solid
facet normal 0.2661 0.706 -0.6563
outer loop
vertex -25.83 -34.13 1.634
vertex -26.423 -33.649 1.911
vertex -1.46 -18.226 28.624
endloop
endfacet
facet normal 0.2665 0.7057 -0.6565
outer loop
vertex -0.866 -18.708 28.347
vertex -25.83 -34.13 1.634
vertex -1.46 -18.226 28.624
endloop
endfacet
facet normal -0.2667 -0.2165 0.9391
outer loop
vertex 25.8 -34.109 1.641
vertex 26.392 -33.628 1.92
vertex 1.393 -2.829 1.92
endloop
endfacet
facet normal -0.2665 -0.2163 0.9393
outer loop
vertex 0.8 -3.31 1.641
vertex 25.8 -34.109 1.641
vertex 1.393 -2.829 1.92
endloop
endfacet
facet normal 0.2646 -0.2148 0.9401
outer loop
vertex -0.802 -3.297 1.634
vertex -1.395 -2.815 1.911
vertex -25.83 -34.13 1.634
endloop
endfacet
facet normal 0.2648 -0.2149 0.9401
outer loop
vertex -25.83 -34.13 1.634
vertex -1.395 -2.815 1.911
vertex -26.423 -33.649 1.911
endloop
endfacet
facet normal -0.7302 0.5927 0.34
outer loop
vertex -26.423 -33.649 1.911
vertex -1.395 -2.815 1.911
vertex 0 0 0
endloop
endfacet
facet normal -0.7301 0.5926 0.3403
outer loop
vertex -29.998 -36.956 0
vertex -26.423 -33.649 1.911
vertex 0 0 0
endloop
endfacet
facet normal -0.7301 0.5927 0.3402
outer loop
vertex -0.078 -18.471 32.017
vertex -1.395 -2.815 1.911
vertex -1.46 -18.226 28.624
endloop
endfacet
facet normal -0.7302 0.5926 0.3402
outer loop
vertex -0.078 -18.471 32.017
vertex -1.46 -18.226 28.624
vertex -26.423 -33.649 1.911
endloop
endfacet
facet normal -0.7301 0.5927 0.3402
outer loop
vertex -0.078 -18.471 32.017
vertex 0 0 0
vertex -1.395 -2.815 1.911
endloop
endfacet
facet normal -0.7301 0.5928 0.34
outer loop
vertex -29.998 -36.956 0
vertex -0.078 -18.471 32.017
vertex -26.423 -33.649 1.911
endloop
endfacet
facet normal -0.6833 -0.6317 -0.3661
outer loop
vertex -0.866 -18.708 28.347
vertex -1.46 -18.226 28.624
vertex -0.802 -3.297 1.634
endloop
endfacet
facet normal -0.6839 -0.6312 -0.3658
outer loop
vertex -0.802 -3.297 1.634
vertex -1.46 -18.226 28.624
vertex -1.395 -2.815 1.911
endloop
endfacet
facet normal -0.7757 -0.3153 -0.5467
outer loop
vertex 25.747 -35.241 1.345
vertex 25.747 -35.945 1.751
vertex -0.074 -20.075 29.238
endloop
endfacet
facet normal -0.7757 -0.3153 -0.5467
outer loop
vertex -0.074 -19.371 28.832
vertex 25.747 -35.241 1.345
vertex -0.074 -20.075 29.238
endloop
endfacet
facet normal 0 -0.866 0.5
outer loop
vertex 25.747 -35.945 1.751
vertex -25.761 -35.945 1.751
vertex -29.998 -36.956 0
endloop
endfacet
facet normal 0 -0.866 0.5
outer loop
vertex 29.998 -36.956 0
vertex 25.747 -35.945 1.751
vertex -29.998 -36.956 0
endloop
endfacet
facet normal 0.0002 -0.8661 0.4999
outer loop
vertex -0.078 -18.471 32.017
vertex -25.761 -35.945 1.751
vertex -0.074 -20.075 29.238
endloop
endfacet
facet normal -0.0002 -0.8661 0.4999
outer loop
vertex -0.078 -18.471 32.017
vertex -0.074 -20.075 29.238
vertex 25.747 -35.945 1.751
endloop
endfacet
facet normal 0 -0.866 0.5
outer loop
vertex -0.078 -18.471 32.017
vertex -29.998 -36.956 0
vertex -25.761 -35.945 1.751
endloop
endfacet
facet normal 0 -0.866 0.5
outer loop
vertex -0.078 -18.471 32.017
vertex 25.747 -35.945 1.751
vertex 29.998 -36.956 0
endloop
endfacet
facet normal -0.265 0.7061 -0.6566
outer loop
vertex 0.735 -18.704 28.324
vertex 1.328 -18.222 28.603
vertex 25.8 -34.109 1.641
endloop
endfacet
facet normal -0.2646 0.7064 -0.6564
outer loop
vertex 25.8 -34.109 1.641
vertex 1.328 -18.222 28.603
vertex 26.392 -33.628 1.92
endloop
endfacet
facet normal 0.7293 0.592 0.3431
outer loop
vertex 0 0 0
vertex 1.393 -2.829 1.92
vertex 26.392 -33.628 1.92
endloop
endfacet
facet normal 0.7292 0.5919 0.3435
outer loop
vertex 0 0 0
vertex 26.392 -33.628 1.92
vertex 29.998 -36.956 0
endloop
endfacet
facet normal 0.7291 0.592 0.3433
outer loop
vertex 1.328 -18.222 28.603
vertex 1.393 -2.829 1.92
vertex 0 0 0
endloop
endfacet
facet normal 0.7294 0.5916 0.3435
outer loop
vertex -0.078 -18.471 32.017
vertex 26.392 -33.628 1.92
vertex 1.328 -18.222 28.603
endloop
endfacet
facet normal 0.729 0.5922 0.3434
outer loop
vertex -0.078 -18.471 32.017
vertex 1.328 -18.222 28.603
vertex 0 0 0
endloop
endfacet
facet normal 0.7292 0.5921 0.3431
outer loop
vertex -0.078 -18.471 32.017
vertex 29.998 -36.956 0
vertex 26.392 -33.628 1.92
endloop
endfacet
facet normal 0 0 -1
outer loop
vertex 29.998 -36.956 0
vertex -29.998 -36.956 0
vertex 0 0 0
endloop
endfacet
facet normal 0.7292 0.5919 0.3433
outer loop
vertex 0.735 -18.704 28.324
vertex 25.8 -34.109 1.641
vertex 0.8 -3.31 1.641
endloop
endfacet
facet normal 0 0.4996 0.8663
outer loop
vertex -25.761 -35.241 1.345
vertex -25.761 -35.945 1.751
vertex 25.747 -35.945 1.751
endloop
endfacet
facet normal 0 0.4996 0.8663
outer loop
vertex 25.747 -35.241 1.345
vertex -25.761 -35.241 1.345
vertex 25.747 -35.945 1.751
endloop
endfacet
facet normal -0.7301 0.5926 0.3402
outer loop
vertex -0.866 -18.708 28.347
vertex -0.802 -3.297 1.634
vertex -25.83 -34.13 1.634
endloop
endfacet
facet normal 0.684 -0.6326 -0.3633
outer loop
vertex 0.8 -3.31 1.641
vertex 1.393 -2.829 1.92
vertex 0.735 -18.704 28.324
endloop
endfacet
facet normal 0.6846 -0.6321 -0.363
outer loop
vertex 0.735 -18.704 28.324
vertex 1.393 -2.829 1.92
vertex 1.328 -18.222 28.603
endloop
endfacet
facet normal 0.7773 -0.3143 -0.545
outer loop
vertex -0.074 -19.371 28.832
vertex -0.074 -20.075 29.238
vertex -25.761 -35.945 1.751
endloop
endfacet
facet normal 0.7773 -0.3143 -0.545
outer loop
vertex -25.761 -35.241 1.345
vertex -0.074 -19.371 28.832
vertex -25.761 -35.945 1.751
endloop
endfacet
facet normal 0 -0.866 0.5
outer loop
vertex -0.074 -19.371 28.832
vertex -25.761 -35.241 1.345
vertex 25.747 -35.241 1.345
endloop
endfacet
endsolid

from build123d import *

# Parameters (mm, degrees)
F7_DEPTH = 0.8128
F8_DEPTH = 0.8128
F9_DEPTH = 0.8128


with BuildPart() as f3:
    # F0 (on Top) → F3 section 0
    with BuildSketch(Plane.XY, mode=Mode.PRIVATE) as f3_s0:
        Polygon((-29.9980398268, -36.9558446109), (29.9980398268, -36.9558446109), (0, 0), align=None)
    loft([f3_s0.sketch, Vertex(-0.0778641552, -18.4707883745, 32.0170565822)])

    # F5 (on face) → F7 (cut)
    with BuildSketch(Plane(origin=(0, -27.7168834582, 16.0023501257), x_dir=(1, 0, 0), z_dir=(0, -0.8660254038, 0.5))):
        Polygon((-25.7607347469, -16.4560821702), (25.7468520606, -16.4560821702), (-0.0737889564, 15.2833462803), align=None)
    extrude(amount=-F7_DEPTH, mode=Mode.SUBTRACT)

    # F6 (on face) → F8 (cut)
    with BuildSketch(Plane(origin=(0, 0, 0), x_dir=(-0.5355684781, 0.8059841071, -0.252103202), z_dir=(0.729232256, 0.591937175, 0.3432647631))):
        Polygon((-41.7223640249, -9.5028096175), (-3.510395555, 1.1444631503), (-22.6090033778, 25.3135608223), align=None)
    extrude(amount=-F8_DEPTH, mode=Mode.SUBTRACT)

    # F4 (on face) → F9 (cut)
    with BuildSketch(Plane(origin=(0, 0, 0), x_dir=(-0.537220985, -0.805456085, 0.250268073), z_dir=(-0.7301171424, 0.5926554607, 0.3401300682))):
        Polygon((3.4951138194, 1.1430482538), (41.776044137, -9.426033441), (22.6281892536, 25.3299917255), align=None)
    extrude(amount=-F9_DEPTH, mode=Mode.SUBTRACT)


solid = f3.part
